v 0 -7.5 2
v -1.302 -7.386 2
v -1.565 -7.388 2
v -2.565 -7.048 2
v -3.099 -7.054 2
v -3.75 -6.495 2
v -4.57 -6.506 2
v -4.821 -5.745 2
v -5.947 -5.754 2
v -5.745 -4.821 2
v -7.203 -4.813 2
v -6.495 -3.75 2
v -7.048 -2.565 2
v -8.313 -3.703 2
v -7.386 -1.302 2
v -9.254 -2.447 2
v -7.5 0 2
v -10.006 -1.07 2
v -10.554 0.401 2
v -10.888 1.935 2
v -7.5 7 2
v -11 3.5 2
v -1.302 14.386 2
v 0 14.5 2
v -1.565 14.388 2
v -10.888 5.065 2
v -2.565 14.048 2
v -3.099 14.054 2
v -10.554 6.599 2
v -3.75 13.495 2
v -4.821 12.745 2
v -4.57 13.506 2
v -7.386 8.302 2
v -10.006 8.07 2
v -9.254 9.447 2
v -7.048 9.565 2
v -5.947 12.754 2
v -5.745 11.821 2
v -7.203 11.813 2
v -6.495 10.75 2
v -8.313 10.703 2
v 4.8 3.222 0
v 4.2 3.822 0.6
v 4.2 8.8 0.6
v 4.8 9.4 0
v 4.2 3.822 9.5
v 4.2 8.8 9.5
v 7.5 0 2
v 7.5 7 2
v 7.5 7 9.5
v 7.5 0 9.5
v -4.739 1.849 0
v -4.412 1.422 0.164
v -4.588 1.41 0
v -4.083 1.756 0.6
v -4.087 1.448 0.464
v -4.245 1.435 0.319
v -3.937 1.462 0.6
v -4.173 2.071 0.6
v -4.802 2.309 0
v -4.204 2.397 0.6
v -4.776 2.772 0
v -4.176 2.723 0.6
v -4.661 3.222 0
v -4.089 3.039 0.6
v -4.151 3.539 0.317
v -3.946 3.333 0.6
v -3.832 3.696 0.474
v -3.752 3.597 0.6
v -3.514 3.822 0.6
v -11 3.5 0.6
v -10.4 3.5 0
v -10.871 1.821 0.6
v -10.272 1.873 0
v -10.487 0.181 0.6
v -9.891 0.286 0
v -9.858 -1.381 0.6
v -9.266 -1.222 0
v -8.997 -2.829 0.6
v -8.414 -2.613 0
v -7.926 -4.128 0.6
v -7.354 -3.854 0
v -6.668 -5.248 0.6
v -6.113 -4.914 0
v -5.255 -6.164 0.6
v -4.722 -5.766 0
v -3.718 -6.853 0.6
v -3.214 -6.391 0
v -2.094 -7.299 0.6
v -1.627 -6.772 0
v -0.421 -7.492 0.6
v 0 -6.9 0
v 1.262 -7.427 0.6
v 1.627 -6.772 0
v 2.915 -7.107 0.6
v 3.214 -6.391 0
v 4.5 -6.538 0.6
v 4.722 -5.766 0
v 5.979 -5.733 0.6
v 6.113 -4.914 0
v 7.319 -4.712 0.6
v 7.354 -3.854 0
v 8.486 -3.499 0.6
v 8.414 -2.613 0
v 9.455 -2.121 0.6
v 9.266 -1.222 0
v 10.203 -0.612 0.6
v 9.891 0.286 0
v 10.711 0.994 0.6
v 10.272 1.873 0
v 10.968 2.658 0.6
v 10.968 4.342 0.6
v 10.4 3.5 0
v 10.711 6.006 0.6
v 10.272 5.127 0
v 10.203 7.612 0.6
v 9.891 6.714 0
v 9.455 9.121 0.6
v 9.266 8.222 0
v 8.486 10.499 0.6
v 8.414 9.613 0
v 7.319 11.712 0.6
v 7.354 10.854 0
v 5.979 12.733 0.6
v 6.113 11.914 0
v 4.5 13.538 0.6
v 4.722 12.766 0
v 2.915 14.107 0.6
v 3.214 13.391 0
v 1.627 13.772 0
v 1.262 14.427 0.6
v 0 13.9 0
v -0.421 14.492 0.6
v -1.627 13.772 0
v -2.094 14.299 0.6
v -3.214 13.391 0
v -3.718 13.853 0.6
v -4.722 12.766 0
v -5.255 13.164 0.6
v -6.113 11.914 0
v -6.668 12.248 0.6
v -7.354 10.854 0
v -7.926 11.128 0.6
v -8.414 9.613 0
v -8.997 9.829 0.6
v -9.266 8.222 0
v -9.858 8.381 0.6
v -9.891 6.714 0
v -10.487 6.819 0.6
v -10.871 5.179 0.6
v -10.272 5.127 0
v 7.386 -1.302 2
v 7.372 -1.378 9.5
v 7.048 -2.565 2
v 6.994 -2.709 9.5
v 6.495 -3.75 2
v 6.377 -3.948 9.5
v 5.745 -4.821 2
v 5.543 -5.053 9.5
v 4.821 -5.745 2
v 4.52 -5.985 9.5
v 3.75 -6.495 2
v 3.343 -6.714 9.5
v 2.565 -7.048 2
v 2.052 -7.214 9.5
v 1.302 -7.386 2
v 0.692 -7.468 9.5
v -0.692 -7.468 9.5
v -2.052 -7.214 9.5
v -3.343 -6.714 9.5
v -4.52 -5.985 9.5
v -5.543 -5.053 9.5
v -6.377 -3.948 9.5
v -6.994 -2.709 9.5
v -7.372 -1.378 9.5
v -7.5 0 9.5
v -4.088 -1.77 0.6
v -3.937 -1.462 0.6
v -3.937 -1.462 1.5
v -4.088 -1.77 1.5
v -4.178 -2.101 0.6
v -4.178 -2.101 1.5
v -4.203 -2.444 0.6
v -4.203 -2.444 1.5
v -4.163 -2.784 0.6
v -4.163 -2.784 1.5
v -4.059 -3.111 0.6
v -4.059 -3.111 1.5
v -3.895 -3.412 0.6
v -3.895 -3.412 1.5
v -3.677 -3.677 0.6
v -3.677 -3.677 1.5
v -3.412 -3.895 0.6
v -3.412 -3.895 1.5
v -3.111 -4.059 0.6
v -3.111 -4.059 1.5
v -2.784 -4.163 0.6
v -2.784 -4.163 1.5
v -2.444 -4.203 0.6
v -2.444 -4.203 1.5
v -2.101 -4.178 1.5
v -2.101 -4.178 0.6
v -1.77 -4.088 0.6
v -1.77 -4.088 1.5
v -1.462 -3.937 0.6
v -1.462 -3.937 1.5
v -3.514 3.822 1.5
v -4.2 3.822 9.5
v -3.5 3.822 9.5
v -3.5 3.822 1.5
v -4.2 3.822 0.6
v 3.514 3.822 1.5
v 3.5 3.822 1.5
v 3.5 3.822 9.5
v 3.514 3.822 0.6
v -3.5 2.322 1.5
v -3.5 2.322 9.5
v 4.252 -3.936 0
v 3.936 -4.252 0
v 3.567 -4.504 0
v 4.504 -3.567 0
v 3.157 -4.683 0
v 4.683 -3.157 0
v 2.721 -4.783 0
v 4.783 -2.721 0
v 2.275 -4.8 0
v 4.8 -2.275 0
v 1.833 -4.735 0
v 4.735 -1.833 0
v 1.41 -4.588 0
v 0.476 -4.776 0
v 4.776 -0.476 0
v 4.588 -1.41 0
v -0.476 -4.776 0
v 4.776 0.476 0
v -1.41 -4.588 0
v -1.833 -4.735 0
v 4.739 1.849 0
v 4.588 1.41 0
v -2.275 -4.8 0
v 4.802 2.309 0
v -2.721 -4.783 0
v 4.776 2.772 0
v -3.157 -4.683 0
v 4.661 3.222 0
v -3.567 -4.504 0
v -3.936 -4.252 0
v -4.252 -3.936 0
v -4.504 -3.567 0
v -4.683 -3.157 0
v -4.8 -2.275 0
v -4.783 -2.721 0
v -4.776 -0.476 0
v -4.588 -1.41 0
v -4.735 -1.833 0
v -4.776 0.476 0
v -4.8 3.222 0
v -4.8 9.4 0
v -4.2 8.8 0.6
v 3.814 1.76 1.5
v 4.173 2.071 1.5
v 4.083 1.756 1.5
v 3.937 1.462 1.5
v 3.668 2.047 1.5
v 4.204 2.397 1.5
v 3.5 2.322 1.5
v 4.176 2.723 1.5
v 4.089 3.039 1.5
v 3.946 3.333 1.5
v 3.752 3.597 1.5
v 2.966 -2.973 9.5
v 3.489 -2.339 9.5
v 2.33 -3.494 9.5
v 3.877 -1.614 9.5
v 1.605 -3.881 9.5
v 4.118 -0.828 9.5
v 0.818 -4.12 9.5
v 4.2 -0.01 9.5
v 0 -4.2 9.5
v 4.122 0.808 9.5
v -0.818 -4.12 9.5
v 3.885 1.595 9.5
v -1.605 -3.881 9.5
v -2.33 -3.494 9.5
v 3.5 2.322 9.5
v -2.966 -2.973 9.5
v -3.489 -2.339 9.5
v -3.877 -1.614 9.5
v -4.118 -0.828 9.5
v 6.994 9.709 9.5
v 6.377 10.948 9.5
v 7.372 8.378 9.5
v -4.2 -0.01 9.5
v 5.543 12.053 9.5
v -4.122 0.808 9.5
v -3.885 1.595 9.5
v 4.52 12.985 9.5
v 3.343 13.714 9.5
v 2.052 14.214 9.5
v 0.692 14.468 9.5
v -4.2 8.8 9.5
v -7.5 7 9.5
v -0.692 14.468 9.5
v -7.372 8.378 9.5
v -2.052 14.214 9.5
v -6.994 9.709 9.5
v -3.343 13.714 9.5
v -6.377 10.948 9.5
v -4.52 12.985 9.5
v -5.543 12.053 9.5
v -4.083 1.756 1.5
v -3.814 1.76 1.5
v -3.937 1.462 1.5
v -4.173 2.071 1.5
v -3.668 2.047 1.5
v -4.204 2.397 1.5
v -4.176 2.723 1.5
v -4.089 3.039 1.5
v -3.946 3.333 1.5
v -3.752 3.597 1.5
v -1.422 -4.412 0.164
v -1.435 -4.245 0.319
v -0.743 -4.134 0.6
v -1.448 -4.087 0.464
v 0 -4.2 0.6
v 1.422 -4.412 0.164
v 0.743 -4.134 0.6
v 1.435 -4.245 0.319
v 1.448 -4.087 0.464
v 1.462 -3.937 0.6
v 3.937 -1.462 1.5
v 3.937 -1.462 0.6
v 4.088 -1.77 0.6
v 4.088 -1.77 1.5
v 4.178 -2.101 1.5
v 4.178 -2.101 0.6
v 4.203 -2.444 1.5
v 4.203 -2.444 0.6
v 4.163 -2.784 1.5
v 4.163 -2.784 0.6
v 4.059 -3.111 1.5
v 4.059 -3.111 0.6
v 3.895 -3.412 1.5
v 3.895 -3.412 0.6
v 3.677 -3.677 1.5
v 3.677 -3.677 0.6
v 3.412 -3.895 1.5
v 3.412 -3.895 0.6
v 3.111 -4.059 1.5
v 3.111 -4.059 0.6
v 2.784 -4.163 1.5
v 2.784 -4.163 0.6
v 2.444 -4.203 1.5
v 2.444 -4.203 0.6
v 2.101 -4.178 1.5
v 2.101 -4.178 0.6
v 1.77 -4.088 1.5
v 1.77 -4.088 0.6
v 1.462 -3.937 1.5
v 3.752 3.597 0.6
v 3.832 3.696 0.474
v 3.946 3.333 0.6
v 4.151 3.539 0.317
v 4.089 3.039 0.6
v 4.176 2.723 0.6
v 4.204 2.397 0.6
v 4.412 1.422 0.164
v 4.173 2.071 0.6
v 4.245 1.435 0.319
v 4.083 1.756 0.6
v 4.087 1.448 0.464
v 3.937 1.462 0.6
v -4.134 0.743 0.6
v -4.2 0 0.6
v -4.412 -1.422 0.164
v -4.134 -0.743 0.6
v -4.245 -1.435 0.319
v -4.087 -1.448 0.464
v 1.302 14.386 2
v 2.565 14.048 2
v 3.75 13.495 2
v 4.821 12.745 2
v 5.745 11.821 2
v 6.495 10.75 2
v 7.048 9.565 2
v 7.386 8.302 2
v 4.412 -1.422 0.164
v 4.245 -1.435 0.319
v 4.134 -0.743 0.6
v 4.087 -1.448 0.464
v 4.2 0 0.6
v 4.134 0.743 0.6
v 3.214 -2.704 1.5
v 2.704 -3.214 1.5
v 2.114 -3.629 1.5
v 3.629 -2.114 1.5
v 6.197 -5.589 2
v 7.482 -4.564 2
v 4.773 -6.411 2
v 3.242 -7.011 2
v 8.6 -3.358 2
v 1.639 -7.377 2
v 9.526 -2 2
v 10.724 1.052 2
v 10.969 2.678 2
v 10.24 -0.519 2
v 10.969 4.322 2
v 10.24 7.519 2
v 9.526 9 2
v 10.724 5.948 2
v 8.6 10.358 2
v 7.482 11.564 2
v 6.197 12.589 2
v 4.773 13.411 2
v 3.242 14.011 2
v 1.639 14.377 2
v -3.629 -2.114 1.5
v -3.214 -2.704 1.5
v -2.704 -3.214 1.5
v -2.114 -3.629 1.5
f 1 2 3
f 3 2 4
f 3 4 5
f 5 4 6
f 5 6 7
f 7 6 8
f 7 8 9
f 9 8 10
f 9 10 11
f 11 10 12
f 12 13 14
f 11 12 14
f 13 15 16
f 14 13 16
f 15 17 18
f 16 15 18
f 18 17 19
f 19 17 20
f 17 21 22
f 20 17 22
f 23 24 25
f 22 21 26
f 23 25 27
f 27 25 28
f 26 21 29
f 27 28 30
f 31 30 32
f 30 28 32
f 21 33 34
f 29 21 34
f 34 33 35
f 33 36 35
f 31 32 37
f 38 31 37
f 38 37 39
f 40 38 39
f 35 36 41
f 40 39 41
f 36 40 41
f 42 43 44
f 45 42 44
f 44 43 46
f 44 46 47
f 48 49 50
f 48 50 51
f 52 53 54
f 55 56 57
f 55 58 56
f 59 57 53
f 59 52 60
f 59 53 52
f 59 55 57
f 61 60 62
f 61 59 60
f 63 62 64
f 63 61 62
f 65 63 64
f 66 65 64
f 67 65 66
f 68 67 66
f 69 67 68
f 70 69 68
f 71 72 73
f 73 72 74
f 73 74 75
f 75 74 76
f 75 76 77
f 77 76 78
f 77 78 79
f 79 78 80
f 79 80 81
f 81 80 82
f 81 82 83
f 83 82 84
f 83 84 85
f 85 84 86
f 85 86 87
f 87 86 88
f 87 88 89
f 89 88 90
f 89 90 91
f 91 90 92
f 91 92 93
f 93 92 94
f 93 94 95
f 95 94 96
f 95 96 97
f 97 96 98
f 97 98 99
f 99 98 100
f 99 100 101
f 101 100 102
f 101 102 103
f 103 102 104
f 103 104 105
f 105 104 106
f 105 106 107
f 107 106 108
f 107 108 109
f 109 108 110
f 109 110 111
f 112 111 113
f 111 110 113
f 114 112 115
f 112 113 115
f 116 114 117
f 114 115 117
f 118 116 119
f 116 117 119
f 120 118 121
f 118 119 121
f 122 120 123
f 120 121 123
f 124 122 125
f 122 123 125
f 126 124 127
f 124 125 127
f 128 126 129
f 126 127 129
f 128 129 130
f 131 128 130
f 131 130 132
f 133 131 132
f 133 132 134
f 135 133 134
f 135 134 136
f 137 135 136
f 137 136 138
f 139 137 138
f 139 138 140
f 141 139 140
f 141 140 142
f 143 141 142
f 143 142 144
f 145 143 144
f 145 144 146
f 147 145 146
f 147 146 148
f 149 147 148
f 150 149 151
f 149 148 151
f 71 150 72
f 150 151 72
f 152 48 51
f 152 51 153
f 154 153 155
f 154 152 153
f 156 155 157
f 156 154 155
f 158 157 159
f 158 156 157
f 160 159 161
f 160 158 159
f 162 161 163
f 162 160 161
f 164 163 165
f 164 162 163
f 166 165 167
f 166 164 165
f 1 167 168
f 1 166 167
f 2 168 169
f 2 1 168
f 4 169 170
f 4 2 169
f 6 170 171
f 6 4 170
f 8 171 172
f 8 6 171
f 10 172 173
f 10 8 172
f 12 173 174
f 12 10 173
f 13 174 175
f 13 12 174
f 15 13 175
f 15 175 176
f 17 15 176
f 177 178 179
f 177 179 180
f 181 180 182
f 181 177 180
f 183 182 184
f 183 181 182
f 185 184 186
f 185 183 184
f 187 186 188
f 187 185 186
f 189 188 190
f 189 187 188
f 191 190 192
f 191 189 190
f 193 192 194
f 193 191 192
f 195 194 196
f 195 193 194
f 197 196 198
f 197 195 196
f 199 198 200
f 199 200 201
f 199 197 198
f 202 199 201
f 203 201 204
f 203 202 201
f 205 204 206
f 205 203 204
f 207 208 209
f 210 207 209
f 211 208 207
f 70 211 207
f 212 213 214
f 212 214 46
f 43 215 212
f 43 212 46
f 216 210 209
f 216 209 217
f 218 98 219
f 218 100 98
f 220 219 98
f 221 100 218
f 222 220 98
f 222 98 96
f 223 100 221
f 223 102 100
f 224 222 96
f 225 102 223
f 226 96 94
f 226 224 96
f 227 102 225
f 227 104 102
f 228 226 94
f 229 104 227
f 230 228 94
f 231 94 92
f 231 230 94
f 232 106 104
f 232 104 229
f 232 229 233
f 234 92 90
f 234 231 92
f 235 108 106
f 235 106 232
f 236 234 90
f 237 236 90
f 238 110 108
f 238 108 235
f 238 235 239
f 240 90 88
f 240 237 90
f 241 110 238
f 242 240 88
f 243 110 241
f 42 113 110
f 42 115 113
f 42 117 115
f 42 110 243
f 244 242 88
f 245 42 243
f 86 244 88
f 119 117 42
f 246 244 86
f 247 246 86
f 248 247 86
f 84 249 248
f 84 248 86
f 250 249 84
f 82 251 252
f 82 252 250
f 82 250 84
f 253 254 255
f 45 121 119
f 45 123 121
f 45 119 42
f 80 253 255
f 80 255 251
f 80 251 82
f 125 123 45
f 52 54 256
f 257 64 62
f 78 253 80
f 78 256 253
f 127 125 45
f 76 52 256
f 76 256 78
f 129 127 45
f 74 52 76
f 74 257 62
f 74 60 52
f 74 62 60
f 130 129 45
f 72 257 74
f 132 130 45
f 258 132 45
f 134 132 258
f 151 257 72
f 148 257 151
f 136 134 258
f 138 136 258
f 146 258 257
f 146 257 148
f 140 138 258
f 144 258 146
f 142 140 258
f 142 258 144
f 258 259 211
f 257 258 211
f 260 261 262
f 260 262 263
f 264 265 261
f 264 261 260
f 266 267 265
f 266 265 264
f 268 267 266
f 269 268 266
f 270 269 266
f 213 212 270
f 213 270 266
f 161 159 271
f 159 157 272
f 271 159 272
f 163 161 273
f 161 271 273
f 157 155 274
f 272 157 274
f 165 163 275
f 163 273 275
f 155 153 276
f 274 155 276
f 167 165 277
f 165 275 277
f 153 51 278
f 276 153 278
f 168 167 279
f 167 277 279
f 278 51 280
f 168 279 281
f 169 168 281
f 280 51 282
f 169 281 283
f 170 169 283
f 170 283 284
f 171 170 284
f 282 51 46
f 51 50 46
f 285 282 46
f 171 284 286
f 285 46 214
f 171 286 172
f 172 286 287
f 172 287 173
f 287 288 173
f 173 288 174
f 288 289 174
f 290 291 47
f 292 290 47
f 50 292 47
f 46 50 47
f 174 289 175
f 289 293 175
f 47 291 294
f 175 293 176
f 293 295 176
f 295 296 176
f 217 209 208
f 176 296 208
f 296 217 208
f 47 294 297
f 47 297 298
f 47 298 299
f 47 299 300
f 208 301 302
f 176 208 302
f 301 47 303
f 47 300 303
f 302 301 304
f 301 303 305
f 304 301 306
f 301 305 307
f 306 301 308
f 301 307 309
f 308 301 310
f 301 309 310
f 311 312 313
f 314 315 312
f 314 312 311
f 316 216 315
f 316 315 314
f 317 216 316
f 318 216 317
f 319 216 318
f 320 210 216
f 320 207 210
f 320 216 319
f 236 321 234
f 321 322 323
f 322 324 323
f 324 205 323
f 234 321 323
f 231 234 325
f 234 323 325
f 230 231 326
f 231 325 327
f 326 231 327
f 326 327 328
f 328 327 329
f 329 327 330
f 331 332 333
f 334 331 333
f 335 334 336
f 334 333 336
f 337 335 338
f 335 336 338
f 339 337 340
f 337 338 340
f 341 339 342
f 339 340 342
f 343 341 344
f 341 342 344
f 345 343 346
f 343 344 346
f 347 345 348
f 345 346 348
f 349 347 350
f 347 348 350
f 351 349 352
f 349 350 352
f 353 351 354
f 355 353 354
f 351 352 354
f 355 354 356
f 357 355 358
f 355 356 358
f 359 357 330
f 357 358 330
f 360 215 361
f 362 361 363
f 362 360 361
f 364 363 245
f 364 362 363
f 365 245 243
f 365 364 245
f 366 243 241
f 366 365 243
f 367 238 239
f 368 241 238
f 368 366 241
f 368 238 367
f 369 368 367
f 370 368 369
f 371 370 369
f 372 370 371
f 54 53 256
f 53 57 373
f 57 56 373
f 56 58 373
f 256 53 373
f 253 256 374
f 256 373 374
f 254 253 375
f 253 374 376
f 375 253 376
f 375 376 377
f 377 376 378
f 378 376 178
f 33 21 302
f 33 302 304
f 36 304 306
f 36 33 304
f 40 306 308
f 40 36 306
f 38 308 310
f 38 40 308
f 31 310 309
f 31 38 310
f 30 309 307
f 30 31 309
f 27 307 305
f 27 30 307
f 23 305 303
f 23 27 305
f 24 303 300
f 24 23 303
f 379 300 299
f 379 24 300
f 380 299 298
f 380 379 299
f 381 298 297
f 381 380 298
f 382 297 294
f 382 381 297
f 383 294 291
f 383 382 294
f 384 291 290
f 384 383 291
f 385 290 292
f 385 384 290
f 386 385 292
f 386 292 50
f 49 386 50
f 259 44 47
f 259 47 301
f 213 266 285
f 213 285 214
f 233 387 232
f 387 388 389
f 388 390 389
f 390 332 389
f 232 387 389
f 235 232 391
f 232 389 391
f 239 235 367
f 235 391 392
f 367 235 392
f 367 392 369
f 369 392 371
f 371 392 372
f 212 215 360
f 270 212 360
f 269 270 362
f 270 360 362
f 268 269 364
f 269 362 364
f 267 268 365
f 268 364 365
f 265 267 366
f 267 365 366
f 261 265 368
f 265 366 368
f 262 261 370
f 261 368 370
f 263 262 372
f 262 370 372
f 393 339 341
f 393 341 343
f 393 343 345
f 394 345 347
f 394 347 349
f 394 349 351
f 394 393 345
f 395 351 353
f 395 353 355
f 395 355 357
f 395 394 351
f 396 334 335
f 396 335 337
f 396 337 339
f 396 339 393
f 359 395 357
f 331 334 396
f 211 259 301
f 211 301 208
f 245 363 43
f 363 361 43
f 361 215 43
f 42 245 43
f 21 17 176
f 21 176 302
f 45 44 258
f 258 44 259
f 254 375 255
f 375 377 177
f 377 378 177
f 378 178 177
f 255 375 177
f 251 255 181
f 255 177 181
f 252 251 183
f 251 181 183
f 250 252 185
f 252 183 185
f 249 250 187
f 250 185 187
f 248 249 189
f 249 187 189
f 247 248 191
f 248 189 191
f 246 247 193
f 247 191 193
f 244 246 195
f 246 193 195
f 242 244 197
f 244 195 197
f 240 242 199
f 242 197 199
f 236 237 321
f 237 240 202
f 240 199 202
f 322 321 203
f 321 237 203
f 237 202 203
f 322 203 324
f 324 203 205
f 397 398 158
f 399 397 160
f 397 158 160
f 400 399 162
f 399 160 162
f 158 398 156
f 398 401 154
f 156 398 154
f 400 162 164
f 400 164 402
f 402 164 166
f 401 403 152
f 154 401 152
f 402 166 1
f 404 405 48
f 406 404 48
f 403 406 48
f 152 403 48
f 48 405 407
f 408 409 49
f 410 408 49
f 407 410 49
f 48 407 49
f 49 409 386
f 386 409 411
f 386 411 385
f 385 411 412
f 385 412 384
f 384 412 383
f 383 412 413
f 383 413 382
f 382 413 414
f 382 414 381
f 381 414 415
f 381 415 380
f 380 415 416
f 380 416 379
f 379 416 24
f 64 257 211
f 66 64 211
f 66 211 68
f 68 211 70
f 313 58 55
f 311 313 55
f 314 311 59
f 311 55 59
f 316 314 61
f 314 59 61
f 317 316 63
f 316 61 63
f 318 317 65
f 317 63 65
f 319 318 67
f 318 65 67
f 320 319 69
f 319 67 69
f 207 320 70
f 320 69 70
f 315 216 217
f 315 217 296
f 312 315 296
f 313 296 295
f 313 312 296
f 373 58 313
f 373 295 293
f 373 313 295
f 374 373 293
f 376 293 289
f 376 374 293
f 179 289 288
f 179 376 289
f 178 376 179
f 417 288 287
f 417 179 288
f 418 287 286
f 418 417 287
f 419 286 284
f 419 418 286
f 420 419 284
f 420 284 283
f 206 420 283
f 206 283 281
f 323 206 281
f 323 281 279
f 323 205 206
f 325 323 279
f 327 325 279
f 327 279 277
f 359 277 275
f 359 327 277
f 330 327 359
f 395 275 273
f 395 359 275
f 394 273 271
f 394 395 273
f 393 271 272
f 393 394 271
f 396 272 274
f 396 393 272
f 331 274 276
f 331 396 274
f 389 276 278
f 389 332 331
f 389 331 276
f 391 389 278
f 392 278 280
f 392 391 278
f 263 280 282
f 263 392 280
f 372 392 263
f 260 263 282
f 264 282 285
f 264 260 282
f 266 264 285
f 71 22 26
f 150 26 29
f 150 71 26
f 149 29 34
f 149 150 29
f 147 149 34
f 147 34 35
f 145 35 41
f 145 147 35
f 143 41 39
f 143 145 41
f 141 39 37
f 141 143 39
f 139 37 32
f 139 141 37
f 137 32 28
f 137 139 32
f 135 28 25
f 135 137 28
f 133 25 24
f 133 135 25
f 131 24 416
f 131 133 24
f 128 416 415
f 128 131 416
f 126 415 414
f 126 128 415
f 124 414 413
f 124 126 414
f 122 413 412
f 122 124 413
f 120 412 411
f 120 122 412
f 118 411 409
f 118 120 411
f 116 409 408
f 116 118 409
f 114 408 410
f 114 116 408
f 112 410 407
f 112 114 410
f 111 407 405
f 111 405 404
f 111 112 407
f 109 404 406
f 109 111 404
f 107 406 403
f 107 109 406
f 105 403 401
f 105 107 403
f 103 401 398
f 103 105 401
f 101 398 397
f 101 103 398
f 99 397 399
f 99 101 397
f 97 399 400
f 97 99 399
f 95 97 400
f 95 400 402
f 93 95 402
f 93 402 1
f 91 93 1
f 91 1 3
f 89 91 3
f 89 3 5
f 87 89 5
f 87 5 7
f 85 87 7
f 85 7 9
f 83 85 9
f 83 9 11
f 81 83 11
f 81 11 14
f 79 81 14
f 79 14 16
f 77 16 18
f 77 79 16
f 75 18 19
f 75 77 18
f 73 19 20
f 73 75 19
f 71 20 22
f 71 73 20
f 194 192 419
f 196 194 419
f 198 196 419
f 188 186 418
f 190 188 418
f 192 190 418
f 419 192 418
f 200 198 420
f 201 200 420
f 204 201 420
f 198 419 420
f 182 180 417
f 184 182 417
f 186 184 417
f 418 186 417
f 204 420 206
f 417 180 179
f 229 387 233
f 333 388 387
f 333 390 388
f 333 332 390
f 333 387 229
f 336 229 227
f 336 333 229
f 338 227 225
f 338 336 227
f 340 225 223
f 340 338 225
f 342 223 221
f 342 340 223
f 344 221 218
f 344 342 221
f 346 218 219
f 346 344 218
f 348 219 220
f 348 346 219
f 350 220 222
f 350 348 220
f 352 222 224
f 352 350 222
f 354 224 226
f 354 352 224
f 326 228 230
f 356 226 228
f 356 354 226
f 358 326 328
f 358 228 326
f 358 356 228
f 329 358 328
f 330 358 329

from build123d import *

# Parameters (mm, degrees)
EXTRUDE_1_DEPTH        = 9.5
SKETCH_8_R             = 11
EXTRUDE_2_DEPTH        = 2
CUT_EXTRUDE_1105_DEPTH = 21.530465168
CUT_EXTRUDE_1724_DEPTH = 1.5
CHAMFER_1_SIZE         = 0.6


with BuildPart() as part:
    # Эскиз7 → Бобышка-Вытянуть1 (new body)
    with BuildSketch(Plane.XY):
        with BuildLine():
            Line((-7.5, 0), (-7.5, 7))
            ThreePointArc((-7.5, 7), (0, 14.5), (7.5, 7))
            Line((7.5, 7), (7.5, 0))
            ThreePointArc((7.5, 0), (0, -7.5), (-7.5, 0))
        make_face()
    extrude(amount=EXTRUDE_1_DEPTH)

    # Эскиз8 → Бобышка-Вытянуть2 (add)
    with BuildSketch(Plane(origin=(0, 0, 0), x_dir=(-1, 0, 0), z_dir=(0, 0, -1))):
        with Locations((0, 3.5)):
            Circle(SKETCH_8_R)
    extrude(amount=-EXTRUDE_2_DEPTH)

    # Эскиз3 → Cut-Extrude 1105 (cut, through all)
    with BuildSketch(Plane(origin=(0, 0, 0), x_dir=(-1, 0, 0), z_dir=(0, 0, -1))):
        with BuildLine():
            Line((-4.2, 8.8), (4.2, 8.8))
            Line((4.2, 8.8), (4.2, 3.821637353))
            Line((4.2, 3.821637353), (3.5, 3.821637353))
            Line((3.5, 3.821637353), (3.5, 2.321637353))
            ThreePointArc((3.5, 2.321637353), (0, -4.2), (-3.5, 2.321637353))
            Line((-3.5, 2.321637353), (-3.5, 3.821637353))
            Line((-3.5, 3.821637353), (-4.2, 3.821637353))
            Line((-4.2, 3.821637353), (-4.2, 8.8))
        make_face()
    extrude(amount=-CUT_EXTRUDE_1105_DEPTH, mode=Mode.SUBTRACT)

    # Эскиз6 → Cut-Extrude 1724 (cut)
    with BuildSketch(Plane(origin=(0, 0, 0), x_dir=(-1, 0, 0), z_dir=(0, 0, -1))):
        with BuildLine():
            ThreePointArc((-1.462331642, 3.937205376), (-3.676955262, 3.676955262), (-3.937205376, 1.462331642))
            ThreePointArc((-3.937205376, 1.462331642), (-2.969848481, 2.969848481), (-1.462331642, 3.937205376))
        make_face()
        with BuildLine():
            ThreePointArc((3.937205376, -1.462331642), (3.676955262, -3.676955262), (1.462331642, -3.937205376))
            ThreePointArc((1.462331642, -3.937205376), (2.969848481, -2.969848481), (3.937205376, -1.462331642))
        make_face()
        with BuildLine():
            ThreePointArc((-1.462331642, -3.937205376), (-2.969848481, -2.969848481), (-3.937205376, -1.462331642))
            ThreePointArc((-3.937205376, -1.462331642), (-3.676955262, -3.676955262), (-1.462331642, -3.937205376))
        make_face()
        with BuildLine():
            ThreePointArc((1.462331642, 3.937205376), (2.969848481, 2.969848481), (3.937205376, 1.462331642))
            ThreePointArc((3.937205376, 1.462331642), (3.676955262, 3.676955262), (1.462331642, 3.937205376))
        make_face()
    extrude(amount=-CUT_EXTRUDE_1724_DEPTH, mode=Mode.SUBTRACT)

    # Фаска1
    chamfer_1_edges = [part.edges().sort_by_distance(p)[0] for p in [
        (11, 3.5, 0),
        (4.2, 6.310818677, 0),
        (3.856775231, 3.821637353, 0),
        (-4.2, 6.310818677, 0),
        (0, 8.8, 0),
        (4.2, 0, 0),
        (0, -4.2, 0),
        (-4.2, 0, 0),
        (-3.856775231, 3.821637353, 0),
        (-4.175552206, 2.722821223, 0),
        (3.676955262, -3.676955262, 0),
        (-3.676955262, -3.676955262, 0),
        (4.175552206, 2.722821223, 0),
    ]]
    chamfer(chamfer_1_edges, length=CHAMFER_1_SIZE)


solid = part.part
